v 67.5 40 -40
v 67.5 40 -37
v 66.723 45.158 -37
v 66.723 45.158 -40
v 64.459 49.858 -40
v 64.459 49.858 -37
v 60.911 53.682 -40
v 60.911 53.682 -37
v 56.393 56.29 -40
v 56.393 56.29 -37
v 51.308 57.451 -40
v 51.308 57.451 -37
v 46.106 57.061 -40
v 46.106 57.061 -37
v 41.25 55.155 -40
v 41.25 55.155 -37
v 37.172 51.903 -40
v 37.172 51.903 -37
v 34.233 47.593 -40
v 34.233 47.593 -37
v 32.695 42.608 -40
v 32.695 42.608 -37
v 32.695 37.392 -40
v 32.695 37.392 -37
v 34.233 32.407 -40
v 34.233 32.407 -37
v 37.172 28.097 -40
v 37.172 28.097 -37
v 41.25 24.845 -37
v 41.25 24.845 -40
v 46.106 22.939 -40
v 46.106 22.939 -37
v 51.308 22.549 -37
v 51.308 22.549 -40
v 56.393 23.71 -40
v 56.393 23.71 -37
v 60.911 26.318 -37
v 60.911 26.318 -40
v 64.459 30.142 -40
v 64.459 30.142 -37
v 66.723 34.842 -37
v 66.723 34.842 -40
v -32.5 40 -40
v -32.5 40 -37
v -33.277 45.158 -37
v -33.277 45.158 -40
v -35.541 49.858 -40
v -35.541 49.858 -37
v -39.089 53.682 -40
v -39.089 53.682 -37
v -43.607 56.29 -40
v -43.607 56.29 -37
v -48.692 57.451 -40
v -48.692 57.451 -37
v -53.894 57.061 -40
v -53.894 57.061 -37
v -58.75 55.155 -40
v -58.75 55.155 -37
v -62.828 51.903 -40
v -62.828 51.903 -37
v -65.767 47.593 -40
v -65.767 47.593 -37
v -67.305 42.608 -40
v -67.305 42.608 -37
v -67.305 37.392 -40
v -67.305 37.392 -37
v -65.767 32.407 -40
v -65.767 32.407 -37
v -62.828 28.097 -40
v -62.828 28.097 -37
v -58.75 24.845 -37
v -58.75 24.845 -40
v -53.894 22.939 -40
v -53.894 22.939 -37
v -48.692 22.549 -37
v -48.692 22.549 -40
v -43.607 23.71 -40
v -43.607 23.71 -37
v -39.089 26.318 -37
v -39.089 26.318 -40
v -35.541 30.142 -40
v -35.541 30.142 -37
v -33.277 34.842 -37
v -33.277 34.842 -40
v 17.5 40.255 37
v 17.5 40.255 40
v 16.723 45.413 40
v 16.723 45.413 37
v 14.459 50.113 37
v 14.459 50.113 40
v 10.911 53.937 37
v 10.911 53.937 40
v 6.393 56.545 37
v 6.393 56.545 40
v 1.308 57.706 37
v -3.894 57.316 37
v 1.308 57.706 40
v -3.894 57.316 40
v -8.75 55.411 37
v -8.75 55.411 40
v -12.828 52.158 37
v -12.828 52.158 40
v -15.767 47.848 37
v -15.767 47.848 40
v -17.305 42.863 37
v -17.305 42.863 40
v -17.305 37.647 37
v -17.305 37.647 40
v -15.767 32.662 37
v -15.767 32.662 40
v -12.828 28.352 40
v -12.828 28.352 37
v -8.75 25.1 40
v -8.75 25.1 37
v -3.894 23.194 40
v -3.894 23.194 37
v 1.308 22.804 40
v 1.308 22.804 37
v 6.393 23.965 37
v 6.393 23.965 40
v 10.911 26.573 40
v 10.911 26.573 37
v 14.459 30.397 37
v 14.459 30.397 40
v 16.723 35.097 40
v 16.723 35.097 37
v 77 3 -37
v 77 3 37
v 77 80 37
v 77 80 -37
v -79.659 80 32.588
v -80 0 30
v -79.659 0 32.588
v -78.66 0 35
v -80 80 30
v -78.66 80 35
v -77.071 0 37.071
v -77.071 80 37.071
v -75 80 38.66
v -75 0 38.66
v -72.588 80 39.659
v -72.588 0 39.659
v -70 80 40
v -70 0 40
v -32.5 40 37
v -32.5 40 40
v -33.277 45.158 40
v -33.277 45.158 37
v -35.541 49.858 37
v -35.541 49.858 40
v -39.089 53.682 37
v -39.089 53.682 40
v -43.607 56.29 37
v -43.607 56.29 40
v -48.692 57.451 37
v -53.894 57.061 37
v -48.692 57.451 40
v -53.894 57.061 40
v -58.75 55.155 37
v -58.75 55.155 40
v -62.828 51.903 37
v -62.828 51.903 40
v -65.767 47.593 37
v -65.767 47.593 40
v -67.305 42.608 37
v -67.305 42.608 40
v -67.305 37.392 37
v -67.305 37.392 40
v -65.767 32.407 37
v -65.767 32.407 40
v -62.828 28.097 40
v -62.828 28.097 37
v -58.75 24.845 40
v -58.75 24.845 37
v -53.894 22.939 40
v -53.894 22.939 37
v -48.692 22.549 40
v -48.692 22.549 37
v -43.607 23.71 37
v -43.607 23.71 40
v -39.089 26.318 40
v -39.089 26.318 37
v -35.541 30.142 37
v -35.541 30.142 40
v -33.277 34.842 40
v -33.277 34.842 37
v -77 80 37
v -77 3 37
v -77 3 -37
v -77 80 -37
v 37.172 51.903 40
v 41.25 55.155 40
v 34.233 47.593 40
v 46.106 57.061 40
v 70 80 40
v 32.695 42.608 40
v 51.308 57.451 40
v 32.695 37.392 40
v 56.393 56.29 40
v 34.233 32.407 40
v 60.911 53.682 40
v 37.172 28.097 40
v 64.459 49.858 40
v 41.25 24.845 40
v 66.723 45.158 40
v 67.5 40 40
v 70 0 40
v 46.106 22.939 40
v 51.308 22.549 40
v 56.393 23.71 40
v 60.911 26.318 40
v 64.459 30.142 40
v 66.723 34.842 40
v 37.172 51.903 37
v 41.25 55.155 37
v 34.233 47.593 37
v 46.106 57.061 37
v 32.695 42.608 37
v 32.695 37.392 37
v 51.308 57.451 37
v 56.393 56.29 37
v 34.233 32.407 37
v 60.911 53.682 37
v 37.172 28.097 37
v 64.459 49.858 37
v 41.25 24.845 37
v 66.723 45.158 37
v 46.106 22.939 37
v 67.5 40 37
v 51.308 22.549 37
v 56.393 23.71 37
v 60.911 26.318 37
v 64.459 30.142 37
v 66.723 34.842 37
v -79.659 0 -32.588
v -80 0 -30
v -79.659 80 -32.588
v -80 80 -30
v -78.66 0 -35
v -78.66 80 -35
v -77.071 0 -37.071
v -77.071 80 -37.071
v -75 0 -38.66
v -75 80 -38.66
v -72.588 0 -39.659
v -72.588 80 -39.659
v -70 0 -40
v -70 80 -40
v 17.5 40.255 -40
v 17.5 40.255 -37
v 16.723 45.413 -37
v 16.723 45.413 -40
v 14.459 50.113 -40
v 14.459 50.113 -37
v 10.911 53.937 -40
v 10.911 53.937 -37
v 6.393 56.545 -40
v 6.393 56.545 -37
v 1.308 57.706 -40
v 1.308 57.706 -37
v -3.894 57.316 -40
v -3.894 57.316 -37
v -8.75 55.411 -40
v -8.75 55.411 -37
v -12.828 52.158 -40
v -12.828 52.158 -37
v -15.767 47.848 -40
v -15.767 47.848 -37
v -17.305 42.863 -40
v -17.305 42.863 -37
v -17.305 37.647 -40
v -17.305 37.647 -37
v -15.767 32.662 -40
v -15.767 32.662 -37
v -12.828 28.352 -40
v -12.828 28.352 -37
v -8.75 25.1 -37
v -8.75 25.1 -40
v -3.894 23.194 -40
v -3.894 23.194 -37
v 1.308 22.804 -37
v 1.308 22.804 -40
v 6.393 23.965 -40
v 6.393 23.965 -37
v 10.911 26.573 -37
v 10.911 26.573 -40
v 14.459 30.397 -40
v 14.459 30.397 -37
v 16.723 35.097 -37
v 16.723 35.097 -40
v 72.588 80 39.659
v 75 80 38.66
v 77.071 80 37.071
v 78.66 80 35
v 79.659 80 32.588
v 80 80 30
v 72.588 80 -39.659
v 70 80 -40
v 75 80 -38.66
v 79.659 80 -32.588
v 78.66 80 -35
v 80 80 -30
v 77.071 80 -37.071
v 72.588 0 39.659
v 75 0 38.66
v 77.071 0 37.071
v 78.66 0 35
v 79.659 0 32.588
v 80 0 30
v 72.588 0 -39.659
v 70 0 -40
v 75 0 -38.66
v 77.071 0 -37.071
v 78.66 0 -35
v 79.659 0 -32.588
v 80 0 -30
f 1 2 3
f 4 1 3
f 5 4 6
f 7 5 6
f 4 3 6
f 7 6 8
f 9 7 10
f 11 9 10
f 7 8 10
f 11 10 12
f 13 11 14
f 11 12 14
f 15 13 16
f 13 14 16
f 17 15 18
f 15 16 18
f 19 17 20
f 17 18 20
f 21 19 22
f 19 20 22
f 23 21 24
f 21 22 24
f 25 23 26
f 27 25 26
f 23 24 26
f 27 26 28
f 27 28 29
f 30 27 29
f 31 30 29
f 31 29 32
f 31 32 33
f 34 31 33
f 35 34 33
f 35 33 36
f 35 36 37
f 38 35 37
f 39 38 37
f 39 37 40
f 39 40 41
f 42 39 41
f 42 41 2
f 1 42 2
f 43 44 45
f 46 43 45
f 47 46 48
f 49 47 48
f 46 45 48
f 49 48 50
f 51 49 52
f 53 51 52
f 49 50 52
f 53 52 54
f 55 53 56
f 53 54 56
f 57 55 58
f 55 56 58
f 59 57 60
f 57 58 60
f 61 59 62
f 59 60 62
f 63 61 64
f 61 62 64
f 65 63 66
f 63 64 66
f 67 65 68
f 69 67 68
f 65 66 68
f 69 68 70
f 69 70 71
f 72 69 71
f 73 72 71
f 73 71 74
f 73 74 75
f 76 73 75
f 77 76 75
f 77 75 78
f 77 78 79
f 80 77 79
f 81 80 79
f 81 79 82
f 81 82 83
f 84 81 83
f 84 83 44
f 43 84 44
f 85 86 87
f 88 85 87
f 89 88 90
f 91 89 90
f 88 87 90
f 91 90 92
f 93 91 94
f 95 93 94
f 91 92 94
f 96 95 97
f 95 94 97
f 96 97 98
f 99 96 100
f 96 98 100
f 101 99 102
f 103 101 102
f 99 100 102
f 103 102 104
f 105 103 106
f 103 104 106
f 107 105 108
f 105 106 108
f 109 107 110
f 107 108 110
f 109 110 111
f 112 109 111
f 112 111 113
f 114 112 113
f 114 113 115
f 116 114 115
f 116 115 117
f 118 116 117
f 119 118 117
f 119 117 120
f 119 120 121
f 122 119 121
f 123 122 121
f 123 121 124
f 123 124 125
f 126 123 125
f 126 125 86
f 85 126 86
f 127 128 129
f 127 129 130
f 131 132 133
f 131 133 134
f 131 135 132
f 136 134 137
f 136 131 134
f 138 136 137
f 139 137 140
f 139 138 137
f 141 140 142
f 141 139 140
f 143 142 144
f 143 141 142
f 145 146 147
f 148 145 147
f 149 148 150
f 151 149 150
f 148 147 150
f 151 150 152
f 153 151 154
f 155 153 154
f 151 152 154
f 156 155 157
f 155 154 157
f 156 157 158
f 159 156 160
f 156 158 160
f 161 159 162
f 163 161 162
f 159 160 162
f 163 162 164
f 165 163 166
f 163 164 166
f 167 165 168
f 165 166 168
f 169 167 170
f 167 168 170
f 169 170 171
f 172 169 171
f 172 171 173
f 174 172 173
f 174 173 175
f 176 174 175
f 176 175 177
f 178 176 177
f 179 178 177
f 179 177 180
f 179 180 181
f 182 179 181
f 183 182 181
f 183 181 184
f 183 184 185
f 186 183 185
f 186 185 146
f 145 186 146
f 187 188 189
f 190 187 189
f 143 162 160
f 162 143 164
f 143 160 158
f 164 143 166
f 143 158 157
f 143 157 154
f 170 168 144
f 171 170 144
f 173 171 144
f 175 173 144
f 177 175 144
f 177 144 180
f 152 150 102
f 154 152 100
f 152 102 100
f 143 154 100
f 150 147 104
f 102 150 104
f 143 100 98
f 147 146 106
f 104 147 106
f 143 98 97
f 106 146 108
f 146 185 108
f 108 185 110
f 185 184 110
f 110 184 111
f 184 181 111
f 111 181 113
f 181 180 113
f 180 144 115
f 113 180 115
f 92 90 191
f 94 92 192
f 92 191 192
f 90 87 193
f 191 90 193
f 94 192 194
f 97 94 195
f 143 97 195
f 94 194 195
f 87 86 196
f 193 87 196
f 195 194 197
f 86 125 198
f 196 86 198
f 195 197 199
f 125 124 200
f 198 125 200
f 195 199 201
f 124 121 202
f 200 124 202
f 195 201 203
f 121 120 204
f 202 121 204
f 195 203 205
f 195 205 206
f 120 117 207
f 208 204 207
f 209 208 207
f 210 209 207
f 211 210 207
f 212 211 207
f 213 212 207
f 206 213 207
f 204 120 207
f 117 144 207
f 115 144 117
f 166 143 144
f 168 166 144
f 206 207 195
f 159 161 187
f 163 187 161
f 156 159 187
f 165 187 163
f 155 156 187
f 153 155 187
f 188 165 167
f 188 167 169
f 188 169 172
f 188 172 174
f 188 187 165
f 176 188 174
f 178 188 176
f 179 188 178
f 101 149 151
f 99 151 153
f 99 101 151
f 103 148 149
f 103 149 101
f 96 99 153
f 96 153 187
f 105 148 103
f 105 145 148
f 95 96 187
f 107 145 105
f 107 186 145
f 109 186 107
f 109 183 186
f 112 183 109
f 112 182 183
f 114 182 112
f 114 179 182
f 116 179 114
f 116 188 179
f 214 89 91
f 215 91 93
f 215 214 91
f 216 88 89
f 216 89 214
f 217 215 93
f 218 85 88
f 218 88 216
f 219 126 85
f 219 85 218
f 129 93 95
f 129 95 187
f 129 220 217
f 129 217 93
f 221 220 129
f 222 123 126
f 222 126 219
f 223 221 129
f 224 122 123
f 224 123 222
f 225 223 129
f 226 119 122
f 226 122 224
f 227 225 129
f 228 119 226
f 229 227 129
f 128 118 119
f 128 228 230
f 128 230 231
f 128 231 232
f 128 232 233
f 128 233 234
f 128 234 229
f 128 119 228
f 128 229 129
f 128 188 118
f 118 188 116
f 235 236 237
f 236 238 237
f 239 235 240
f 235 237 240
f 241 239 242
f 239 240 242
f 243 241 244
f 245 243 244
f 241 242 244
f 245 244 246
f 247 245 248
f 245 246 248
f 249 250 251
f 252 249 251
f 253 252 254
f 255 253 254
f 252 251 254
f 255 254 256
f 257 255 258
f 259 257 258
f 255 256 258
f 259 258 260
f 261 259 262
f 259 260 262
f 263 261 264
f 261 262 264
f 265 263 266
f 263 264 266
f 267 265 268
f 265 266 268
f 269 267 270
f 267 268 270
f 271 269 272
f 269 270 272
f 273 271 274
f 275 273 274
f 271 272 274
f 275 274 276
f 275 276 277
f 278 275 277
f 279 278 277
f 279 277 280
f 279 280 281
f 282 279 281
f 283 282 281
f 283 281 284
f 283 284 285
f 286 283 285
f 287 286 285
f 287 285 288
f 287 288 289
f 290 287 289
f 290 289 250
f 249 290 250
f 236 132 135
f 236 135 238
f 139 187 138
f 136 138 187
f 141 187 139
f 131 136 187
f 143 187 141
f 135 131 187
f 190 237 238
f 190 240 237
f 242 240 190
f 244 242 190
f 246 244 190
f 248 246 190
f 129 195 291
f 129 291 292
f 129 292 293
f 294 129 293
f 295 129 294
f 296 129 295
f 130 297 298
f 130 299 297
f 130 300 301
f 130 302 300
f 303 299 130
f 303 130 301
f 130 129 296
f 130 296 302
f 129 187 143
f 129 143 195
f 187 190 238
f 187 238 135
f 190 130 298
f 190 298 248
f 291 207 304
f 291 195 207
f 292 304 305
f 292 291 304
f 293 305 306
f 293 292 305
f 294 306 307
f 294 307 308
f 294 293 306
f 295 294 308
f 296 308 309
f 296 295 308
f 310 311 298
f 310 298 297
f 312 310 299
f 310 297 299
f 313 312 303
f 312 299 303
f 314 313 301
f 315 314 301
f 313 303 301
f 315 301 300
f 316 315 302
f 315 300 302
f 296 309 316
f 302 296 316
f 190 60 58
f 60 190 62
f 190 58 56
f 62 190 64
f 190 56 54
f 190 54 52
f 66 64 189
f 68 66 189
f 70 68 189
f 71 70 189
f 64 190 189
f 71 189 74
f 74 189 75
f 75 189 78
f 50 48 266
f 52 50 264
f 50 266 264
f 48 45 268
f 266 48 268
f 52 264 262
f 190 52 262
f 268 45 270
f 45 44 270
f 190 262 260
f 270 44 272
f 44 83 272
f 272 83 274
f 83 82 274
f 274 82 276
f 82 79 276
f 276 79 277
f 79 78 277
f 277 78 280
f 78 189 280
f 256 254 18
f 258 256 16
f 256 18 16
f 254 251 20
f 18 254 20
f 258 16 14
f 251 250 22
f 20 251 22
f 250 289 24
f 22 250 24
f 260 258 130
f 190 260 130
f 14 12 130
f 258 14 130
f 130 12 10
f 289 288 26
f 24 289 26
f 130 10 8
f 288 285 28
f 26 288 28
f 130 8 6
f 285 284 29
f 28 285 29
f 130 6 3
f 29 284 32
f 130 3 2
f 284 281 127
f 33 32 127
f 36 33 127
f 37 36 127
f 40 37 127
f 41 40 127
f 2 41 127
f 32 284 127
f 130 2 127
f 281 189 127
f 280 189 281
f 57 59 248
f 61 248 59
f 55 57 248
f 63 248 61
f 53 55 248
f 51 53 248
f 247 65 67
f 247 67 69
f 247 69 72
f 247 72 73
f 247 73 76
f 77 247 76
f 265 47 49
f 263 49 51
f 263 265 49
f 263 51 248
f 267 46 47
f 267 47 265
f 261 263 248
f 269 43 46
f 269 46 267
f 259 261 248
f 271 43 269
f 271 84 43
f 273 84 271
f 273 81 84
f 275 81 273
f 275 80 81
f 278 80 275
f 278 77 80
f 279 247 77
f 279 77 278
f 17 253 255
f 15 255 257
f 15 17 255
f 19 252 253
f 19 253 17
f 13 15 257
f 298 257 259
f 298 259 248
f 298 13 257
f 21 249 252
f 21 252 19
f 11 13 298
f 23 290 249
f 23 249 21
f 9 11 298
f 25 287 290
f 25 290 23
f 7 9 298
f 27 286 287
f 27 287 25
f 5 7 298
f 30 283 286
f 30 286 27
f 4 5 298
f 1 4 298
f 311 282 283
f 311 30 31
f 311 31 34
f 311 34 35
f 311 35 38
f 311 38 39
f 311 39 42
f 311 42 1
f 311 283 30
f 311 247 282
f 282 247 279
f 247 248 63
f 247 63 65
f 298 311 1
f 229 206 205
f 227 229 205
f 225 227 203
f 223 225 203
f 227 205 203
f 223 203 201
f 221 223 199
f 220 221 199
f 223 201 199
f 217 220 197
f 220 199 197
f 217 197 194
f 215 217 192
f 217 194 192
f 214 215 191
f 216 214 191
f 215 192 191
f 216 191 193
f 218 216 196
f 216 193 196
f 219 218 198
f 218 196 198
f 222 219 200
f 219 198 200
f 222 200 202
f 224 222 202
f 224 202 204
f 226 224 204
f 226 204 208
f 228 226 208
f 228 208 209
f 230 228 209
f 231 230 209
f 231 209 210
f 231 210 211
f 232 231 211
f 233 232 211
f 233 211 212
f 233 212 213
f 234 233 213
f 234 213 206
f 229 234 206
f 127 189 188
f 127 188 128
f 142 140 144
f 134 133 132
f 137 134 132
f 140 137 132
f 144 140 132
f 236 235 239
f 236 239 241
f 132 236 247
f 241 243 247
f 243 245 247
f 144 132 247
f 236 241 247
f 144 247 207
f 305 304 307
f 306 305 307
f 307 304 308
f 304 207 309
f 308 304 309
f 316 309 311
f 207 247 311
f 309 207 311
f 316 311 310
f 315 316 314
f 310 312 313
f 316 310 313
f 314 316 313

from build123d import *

# Parameters (mm, degrees)
SKETCH1_W           = 160
SKETCH1_H           = 80
BOSS_EXTRUDE1_DEPTH = 80
SHELL1_T            = -3
SKETCH2_R           = 17.5
CUT_EXTRUDE1_DEPTH  = 80
FILLET1_R           = 10


with BuildPart() as part:
    # Sketch1 → Boss-Extrude1 (new body)
    with BuildSketch(Plane(origin=(0, 0, 0), x_dir=(1, 0, 0), z_dir=(0, 1, 0))):
        Rectangle(SKETCH1_W, SKETCH1_H)
    extrude(amount=BOSS_EXTRUDE1_DEPTH)

    # Shell1
    shell1_openings = [part.faces().sort_by_distance(p)[0] for p in [
        (0, 80, 0),
    ]]
    offset(amount=SHELL1_T, openings=shell1_openings, kind=Kind.INTERSECTION)

    # Sketch2 → Cut-Extrude1 (cut)
    with BuildSketch(Plane.XY.offset(40)):
        with Locations((-50, 40)):
            Circle(SKETCH2_R)
        with Locations((0, 40.255057562)):
            Circle(SKETCH2_R)
        with Locations((50, 40)):
            Circle(SKETCH2_R)
    extrude(amount=-CUT_EXTRUDE1_DEPTH, mode=Mode.SUBTRACT)

    # Fillet1
    fillet1_edges = [part.edges().sort_by_distance(p)[0] for p in [
        (80, 40, 40),
        (-80, 40, 40),
        (-80, 40, -40),
        (80, 40, -40),
    ]]
    fillet(fillet1_edges, radius=FILLET1_R)


solid = part.part
